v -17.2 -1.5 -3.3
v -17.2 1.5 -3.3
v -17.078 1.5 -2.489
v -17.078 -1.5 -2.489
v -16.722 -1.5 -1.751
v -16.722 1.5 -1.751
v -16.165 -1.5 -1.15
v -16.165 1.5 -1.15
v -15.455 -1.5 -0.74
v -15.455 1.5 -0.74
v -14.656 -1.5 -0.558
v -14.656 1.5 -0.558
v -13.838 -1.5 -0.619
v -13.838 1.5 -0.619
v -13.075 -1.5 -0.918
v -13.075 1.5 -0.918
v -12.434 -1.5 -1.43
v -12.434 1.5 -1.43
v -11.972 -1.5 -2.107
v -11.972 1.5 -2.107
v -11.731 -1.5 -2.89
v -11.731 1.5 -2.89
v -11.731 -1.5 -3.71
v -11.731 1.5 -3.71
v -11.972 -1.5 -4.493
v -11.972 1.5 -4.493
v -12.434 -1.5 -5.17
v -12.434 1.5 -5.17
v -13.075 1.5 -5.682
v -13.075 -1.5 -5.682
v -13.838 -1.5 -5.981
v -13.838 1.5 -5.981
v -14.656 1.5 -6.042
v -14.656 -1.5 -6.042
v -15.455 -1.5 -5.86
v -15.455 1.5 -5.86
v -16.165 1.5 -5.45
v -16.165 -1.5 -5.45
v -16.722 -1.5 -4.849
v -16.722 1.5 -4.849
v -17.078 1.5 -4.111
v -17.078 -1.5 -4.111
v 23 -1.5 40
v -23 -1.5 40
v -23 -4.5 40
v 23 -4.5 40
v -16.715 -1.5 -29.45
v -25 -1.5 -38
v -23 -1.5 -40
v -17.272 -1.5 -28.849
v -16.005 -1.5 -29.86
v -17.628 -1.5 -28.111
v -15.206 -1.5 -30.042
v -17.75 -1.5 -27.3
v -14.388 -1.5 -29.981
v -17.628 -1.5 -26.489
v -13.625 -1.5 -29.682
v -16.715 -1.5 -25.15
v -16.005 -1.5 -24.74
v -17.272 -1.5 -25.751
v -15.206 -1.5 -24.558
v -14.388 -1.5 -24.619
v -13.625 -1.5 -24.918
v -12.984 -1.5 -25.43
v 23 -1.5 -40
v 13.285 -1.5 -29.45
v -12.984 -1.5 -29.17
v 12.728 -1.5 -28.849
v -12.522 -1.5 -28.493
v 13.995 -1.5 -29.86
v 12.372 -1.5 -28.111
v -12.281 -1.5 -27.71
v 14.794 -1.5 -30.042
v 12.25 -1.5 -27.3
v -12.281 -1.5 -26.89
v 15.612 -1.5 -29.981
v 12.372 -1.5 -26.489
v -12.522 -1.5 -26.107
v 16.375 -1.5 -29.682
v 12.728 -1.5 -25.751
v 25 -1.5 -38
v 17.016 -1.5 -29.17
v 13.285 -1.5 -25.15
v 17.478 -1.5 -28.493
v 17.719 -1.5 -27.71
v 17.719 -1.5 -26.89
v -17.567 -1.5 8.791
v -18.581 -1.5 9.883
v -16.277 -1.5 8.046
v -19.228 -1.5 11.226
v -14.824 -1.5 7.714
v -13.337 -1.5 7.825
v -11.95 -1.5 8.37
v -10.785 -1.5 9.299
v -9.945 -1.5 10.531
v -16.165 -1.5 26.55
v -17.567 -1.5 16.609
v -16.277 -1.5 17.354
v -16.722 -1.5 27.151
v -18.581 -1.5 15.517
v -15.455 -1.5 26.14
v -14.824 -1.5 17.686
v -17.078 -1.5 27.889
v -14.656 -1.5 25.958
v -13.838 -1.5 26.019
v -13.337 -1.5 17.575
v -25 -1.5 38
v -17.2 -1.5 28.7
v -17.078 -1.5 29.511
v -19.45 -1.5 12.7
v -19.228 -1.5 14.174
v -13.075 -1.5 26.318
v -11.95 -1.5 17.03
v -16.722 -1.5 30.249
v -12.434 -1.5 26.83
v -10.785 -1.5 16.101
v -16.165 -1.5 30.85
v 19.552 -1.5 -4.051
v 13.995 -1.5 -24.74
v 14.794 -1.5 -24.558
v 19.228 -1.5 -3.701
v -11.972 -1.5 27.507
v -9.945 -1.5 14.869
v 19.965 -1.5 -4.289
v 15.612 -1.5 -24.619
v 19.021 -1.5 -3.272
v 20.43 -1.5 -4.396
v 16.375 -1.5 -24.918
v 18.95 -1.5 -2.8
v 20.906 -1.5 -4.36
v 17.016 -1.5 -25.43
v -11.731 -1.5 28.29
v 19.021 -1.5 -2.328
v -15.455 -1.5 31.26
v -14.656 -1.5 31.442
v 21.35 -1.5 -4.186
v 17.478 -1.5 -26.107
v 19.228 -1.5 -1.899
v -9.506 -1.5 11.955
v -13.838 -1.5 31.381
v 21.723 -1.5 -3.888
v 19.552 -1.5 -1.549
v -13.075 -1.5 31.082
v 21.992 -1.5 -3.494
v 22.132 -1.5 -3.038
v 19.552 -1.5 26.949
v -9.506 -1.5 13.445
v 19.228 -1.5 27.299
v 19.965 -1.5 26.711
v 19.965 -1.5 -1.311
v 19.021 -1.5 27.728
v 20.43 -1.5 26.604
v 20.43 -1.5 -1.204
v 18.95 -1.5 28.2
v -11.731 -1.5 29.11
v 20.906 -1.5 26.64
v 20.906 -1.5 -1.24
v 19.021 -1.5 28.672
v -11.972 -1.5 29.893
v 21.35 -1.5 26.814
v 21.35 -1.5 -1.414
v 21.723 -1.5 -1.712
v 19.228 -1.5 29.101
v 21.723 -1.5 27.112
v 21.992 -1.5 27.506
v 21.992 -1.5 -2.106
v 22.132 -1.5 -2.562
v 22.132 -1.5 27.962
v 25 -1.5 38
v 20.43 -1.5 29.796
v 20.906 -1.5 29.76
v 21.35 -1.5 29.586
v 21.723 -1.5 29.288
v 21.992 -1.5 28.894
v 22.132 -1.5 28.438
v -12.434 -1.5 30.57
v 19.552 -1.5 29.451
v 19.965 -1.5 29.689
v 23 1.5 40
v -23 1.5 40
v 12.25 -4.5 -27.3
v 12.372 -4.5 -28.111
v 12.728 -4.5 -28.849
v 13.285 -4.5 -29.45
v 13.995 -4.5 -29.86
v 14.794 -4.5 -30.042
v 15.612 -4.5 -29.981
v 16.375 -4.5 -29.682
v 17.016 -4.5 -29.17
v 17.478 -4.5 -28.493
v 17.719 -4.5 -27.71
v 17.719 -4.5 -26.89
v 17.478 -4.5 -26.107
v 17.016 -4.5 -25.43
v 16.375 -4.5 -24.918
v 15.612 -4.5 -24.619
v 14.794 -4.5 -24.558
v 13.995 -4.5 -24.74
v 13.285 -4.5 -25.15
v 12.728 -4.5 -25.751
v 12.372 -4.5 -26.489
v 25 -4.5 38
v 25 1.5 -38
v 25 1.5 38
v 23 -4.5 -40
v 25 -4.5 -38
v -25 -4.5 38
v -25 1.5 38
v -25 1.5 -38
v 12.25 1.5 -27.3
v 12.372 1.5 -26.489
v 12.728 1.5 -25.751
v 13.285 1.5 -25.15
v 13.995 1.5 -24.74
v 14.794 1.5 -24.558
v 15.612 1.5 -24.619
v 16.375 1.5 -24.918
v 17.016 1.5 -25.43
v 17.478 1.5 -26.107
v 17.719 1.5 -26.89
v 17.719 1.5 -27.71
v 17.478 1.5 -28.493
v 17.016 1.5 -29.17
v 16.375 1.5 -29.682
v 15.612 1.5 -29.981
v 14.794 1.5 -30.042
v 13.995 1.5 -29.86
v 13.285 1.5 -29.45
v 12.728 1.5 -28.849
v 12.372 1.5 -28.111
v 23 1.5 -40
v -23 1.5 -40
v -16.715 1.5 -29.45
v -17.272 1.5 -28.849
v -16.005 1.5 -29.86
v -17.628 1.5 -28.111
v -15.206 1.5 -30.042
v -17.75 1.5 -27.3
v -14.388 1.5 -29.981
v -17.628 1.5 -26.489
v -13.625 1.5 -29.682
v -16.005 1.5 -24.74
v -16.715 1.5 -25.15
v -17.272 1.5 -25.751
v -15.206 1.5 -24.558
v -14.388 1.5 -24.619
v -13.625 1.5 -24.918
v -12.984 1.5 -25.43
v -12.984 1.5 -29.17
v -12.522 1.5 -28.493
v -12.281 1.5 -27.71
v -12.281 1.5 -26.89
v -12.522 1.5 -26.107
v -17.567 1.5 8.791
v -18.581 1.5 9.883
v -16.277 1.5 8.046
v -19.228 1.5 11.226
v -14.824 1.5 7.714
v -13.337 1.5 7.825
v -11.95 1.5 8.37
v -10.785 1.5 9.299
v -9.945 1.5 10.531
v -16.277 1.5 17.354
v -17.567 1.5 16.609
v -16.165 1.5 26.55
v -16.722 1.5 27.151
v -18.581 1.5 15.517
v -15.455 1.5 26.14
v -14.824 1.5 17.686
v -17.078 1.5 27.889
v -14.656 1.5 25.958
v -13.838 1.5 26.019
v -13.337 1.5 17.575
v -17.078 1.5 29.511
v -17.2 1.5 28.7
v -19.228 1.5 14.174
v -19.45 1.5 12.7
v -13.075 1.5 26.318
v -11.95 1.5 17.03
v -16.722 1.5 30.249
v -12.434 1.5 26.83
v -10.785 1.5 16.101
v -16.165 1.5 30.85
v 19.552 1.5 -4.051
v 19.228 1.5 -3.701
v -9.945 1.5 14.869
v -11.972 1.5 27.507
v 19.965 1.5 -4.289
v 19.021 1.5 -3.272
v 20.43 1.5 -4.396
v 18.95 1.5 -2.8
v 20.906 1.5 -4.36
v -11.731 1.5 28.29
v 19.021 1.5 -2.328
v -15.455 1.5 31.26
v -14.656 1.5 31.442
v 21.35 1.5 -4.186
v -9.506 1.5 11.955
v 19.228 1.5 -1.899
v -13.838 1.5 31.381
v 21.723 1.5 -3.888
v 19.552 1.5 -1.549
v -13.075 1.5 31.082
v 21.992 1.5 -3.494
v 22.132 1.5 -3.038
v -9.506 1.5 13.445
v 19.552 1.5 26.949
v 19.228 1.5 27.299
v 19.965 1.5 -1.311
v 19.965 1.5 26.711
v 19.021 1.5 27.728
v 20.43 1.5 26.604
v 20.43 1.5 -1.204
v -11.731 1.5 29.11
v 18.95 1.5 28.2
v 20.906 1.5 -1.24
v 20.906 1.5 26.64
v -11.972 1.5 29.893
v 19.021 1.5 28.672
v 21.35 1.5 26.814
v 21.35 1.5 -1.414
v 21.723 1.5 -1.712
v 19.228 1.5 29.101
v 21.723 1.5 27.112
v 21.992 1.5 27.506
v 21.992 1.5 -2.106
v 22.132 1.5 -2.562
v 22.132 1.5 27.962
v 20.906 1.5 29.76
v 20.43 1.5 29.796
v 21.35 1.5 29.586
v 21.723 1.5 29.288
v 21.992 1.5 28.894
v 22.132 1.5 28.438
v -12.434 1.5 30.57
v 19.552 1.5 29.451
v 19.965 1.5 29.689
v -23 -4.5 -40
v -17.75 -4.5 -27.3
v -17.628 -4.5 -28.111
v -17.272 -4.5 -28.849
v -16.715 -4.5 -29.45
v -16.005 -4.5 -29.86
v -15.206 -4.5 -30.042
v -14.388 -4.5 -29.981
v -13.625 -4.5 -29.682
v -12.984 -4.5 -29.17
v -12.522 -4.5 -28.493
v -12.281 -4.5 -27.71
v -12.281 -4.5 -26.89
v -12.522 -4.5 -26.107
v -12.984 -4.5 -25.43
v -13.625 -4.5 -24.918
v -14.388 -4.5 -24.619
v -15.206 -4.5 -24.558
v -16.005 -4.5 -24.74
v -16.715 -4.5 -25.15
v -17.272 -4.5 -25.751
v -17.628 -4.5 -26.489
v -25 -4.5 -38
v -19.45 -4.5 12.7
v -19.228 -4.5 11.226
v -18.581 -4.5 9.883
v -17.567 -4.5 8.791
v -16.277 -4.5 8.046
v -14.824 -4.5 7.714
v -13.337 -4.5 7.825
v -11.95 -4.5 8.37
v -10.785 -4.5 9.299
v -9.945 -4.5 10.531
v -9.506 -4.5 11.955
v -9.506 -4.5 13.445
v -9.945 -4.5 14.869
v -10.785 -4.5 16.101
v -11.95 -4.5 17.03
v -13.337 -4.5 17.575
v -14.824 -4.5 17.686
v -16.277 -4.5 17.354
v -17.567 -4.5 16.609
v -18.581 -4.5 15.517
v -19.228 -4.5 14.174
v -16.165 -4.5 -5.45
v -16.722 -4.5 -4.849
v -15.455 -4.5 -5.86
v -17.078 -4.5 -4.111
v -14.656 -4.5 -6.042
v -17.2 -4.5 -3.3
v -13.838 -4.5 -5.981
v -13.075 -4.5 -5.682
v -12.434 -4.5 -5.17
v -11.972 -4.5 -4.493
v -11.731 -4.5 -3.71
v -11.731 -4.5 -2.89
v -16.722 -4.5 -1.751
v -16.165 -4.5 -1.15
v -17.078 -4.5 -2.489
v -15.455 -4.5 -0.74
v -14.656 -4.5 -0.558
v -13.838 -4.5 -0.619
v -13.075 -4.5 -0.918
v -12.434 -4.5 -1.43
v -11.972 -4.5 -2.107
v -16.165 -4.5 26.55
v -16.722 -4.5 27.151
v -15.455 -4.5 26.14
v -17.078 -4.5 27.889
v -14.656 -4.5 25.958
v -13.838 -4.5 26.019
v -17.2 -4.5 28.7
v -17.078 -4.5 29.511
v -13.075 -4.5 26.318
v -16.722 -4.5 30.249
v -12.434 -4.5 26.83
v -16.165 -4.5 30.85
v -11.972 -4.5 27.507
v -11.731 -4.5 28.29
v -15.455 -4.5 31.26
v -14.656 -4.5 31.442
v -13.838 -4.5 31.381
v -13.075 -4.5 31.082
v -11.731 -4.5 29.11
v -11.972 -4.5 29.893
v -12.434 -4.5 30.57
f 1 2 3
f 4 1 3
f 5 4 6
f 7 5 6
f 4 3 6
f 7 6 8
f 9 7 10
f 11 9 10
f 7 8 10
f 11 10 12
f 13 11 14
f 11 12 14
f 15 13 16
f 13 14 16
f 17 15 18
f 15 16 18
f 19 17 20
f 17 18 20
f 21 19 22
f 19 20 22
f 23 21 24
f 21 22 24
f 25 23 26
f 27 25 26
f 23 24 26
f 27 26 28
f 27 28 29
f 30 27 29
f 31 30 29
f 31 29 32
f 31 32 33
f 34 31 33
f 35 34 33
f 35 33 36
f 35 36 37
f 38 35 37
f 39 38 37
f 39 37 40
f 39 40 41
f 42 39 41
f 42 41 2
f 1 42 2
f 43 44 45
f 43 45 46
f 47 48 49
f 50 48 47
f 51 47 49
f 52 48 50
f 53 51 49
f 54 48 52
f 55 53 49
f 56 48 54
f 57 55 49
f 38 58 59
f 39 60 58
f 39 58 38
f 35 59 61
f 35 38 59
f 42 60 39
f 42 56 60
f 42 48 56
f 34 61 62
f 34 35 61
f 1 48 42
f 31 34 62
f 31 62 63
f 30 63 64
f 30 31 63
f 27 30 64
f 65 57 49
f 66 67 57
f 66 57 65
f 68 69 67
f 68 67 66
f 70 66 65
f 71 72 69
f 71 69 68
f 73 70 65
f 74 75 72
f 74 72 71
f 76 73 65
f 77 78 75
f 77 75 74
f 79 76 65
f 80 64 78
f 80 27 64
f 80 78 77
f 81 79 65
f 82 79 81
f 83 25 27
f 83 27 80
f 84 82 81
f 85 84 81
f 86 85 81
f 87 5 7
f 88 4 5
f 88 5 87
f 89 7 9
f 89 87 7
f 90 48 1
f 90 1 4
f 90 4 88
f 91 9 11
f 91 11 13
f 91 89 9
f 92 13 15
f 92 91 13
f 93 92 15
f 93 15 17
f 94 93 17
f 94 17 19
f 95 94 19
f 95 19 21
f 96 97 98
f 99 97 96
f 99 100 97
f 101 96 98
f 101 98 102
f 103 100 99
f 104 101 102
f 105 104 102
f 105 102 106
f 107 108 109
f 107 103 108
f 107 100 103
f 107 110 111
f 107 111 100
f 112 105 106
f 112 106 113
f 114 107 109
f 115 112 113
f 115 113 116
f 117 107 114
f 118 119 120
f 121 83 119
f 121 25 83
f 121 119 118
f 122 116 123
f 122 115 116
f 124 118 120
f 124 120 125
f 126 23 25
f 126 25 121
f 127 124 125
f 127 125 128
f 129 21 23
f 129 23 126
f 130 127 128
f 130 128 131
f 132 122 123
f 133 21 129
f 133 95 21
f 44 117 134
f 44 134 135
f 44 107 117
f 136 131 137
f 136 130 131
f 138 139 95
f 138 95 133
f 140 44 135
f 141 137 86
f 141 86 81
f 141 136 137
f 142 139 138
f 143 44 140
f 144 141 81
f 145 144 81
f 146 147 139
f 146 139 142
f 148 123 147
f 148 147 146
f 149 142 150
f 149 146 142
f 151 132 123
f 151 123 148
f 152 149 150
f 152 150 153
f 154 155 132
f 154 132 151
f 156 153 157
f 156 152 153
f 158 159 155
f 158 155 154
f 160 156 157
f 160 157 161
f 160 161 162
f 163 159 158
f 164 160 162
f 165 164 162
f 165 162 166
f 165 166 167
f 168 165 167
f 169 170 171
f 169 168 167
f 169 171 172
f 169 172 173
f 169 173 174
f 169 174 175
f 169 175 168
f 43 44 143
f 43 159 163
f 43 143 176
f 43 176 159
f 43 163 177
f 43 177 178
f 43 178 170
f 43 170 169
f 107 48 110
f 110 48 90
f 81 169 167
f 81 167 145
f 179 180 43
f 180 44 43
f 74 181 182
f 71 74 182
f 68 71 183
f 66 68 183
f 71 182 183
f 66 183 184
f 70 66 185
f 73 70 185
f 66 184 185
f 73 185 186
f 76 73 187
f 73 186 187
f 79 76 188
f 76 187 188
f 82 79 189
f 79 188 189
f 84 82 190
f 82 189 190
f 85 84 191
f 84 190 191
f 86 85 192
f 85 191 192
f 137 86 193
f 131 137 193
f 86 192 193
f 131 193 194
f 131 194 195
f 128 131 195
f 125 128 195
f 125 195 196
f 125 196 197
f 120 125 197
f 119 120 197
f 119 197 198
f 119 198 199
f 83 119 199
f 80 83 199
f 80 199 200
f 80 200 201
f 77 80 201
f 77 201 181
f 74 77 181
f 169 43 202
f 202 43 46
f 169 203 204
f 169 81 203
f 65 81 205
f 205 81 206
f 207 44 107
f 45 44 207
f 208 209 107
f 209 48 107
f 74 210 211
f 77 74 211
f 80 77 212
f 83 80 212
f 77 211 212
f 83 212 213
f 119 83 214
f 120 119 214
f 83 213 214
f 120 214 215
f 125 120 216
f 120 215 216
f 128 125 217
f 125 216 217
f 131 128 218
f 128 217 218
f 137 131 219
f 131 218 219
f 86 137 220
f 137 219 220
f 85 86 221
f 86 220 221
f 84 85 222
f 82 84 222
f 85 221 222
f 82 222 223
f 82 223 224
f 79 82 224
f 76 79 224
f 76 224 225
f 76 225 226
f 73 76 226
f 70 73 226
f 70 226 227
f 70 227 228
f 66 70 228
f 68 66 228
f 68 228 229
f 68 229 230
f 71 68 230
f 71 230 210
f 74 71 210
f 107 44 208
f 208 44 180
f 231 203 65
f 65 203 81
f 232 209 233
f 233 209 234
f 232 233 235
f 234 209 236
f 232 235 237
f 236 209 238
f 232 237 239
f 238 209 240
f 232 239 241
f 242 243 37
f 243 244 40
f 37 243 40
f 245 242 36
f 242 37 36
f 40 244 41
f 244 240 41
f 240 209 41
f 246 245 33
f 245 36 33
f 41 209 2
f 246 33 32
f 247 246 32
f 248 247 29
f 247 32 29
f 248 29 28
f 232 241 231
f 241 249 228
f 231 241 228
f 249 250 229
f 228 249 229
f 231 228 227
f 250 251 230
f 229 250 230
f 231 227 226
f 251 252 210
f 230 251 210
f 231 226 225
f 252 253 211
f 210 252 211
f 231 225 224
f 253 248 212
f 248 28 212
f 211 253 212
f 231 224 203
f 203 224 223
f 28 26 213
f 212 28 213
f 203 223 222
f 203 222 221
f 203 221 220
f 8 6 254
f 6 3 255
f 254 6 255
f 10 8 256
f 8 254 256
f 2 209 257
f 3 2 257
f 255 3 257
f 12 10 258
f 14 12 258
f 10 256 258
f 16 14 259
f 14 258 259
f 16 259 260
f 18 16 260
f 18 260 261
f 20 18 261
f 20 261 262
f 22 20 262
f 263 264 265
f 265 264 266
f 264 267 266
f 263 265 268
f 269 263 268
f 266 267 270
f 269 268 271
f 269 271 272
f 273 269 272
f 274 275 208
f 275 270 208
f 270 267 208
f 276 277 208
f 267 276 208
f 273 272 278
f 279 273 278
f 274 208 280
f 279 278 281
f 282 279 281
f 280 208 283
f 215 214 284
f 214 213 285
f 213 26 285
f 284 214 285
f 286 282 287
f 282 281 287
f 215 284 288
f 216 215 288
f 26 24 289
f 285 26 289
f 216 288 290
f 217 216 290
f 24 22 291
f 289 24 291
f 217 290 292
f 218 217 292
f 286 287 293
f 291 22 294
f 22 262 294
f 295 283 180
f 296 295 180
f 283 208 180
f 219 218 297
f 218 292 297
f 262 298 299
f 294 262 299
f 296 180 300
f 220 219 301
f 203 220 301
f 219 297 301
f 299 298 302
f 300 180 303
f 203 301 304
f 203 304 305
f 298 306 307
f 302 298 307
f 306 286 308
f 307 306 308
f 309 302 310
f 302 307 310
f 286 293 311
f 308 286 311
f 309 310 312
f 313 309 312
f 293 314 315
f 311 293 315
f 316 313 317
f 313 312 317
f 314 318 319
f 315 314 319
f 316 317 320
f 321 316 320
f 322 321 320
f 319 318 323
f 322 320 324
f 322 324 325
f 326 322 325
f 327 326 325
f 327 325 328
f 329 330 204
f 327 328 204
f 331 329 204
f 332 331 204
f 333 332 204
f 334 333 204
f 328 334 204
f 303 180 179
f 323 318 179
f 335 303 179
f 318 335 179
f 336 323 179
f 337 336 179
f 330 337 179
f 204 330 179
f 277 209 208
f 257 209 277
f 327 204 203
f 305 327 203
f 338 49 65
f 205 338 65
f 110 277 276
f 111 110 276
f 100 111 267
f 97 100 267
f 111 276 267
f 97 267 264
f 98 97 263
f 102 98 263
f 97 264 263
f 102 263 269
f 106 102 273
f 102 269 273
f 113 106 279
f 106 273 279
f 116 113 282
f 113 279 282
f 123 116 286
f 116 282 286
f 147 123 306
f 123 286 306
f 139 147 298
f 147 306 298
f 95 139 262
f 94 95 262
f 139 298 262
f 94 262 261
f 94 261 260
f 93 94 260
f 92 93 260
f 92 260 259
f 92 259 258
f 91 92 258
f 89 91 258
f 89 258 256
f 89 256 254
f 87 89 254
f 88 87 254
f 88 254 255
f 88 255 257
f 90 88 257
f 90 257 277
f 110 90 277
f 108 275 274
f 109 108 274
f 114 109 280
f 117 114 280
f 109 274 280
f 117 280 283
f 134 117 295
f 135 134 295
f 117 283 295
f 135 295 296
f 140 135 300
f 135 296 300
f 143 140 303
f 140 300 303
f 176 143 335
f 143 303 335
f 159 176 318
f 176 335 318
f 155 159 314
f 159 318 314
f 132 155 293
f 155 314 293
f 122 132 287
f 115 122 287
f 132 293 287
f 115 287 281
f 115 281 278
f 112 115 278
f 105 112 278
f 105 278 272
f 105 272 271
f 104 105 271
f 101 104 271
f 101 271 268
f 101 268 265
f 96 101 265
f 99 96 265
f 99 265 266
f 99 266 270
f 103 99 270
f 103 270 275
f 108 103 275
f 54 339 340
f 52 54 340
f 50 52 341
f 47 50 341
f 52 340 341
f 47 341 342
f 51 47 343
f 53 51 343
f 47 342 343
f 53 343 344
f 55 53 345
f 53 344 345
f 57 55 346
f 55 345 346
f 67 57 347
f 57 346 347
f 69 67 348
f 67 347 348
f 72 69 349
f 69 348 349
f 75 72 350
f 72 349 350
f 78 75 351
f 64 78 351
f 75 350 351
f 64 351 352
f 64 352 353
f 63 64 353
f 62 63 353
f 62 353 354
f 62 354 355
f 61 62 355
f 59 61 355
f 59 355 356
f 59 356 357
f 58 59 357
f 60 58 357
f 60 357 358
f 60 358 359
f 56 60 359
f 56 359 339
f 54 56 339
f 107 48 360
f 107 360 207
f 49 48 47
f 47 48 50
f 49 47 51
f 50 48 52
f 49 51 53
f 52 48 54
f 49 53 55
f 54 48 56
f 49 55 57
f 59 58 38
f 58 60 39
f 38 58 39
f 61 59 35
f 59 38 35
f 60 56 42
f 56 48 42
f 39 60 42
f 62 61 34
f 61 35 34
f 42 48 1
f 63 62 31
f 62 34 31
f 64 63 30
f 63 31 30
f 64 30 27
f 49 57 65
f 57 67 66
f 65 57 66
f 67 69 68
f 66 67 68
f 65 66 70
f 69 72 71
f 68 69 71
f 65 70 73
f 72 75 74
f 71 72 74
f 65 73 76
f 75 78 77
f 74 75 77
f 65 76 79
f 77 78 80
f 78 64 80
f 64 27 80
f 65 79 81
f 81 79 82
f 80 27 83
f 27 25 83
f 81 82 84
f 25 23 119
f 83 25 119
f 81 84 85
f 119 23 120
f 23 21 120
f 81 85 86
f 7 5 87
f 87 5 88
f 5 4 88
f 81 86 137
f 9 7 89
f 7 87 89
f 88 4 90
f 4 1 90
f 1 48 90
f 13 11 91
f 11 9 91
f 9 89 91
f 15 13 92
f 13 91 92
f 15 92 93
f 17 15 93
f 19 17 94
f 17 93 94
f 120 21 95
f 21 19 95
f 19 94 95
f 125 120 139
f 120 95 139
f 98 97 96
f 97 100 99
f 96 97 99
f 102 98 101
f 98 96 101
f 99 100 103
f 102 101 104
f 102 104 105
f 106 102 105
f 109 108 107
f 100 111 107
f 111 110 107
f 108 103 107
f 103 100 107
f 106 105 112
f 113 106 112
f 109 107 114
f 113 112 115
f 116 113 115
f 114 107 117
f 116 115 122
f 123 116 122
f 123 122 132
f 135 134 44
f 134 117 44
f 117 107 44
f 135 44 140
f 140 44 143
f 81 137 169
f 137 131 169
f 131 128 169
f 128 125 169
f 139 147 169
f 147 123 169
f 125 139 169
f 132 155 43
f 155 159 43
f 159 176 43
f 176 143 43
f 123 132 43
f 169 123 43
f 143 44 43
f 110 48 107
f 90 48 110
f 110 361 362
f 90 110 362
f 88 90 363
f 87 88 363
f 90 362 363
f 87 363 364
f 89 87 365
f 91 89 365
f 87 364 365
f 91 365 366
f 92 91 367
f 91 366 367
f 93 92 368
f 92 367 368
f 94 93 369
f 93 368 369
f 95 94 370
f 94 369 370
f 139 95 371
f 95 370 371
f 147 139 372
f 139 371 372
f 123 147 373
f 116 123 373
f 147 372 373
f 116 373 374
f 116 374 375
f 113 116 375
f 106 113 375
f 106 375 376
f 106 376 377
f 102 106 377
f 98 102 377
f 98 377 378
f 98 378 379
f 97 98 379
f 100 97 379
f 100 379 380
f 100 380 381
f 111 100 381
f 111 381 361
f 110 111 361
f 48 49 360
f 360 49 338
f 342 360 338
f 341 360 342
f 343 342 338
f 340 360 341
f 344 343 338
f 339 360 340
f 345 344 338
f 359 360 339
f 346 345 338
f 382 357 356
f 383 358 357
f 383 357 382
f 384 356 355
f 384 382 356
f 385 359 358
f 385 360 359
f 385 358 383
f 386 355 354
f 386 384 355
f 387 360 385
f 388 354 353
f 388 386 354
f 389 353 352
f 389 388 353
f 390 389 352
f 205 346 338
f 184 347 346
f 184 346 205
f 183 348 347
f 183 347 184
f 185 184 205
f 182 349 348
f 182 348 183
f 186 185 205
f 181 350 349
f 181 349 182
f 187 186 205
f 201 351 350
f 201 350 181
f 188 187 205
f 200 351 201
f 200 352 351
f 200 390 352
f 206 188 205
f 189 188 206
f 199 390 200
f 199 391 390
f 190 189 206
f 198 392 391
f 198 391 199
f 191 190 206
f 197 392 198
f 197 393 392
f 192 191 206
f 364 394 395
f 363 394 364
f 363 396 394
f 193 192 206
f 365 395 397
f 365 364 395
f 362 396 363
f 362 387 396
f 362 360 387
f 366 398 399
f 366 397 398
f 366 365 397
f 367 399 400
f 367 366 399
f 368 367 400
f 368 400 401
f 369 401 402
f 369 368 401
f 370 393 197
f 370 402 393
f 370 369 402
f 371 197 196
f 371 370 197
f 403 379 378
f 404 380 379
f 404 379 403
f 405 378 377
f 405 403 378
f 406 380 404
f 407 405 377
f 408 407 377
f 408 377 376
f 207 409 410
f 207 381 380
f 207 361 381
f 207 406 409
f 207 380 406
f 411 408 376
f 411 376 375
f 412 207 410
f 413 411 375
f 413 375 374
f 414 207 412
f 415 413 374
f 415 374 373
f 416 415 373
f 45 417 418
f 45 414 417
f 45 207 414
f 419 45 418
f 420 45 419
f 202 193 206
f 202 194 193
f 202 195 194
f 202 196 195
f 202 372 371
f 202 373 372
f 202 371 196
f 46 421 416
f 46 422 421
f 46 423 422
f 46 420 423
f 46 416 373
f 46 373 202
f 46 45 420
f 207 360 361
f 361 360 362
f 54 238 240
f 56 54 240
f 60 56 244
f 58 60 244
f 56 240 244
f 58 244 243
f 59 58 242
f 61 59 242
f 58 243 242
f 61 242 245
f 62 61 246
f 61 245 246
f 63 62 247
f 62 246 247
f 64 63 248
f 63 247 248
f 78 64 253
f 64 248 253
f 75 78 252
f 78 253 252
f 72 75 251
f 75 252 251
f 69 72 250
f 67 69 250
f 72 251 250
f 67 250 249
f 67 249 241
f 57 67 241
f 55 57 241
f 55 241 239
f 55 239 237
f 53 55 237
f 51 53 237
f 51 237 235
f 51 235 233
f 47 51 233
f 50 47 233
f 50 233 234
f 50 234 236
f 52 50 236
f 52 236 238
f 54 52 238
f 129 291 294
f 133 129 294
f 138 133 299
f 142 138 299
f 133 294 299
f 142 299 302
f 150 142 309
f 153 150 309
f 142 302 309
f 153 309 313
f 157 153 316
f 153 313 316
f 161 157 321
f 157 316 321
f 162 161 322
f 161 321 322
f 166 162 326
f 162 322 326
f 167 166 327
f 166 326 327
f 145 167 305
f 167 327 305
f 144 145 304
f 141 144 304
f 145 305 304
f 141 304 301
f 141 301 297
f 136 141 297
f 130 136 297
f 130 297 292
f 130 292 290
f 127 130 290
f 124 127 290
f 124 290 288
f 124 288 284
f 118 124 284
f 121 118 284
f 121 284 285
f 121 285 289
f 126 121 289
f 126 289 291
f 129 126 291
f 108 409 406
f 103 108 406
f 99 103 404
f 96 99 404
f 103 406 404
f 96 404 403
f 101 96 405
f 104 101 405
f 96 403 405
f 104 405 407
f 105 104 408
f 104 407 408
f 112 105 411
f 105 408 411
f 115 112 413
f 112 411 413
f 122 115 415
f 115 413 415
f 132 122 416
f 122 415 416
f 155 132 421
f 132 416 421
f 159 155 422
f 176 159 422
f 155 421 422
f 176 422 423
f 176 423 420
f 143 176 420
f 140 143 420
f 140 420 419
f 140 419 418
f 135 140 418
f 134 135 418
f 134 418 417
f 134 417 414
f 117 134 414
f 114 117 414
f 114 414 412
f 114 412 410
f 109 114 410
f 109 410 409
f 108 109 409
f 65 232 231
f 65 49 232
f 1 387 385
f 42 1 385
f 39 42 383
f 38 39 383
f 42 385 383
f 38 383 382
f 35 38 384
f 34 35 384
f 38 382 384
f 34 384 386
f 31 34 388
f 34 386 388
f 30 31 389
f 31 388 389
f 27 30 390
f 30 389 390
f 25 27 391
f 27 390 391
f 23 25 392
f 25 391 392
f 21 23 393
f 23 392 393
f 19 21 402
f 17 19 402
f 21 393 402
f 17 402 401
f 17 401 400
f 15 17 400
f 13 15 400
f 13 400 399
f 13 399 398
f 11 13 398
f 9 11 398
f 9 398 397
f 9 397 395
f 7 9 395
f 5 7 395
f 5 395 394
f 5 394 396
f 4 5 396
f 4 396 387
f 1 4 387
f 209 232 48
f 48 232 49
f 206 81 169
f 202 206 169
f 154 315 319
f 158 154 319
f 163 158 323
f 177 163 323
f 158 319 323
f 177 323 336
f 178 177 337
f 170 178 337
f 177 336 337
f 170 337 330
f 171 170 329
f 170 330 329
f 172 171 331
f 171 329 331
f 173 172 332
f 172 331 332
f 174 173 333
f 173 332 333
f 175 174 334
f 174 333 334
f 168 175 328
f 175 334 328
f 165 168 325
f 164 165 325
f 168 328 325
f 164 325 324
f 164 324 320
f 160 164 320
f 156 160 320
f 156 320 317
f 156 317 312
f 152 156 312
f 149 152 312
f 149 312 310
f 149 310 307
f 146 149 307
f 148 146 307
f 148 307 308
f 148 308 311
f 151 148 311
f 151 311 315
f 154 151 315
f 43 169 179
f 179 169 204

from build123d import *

# Parameters (mm, degrees)
F0_W     = 50
F0_H     = 80
F1_DEPTH = 1.5
F3_D     = 5.5
F4_D     = 3.2
F5_SIZE  = 2
F6_D     = 5.5
F7_D     = 10
F2_W     = 50
F2_H     = 80
F8_DEPTH = 3
F9_SIZE  = 2
F10_D    = 5.5
F11_D    = 5.5
F12_D    = 10


with BuildPart() as f1:
    # F0 (on Front) → F1 (new body, symmetric)
    with BuildSketch(Plane.XZ):
        Rectangle(F0_W, F0_H)
    extrude(amount=F1_DEPTH, both=True)

    # F3 (through all)
    with Locations(Plane.XZ.offset(1.5)):
        with Locations((-15, -27.3), (15, -27.3)):
            Hole(F3_D / 2)

    # F4 (through all)
    with Locations(Plane.XZ.offset(1.5)):
        with Locations((20.55, 28.2), (20.55, -2.8)):
            Hole(F4_D / 2)

    # F5
    f5_edges = [f1.edges().sort_by_distance(p)[0] for p in [
        (-25, 0, 40),
        (-25, 0, -40),
        (25, 0, 40),
        (25, 0, -40),
    ]]
    chamfer(f5_edges, length=F5_SIZE)

    # F6 (through all)
    with Locations(Plane.XZ.offset(1.5)):
        with Locations((-14.45, 28.7), (-14.45, -3.3)):
            Hole(F6_D / 2)

    # F7 (through all)
    with Locations(Plane.XZ.offset(1.5)):
        with Locations((-14.45, 12.7)):
            Hole(F7_D / 2)


with BuildPart() as f8:
    # F2 (on face) → F8 (new body)
    with BuildSketch(Plane.XZ.offset(1.5)):
        Rectangle(F2_W, F2_H)
    extrude(amount=F8_DEPTH)

    # F9
    f9_edges = [f8.edges().sort_by_distance(p)[0] for p in [
        (25, -3, 40),
        (-25, -3, 40),
        (25, -3, -40),
        (-25, -3, -40),
    ]]
    chamfer(f9_edges, length=F9_SIZE)

    # F10 (through all)
    with Locations(Plane(origin=(0, -1.5, 0), x_dir=(1, 0, 0), z_dir=(0, 1, 0))):
        with Locations((15, 27.3), (-15, 27.3)):
            Hole(F10_D / 2)

    # F11 (through all)
    with Locations(Plane(origin=(0, -1.5, 0), x_dir=(1, 0, 0), z_dir=(0, 1, 0))):
        with Locations((-14.45, -28.7), (-14.45, 3.3)):
            Hole(F11_D / 2)

    # F12 (through all)
    with Locations(Plane(origin=(0, -1.5, 0), x_dir=(1, 0, 0), z_dir=(0, 1, 0))):
        with Locations((-14.45, -12.7)):
            Hole(F12_D / 2)


solid = Compound([f1.part, f8.part])
